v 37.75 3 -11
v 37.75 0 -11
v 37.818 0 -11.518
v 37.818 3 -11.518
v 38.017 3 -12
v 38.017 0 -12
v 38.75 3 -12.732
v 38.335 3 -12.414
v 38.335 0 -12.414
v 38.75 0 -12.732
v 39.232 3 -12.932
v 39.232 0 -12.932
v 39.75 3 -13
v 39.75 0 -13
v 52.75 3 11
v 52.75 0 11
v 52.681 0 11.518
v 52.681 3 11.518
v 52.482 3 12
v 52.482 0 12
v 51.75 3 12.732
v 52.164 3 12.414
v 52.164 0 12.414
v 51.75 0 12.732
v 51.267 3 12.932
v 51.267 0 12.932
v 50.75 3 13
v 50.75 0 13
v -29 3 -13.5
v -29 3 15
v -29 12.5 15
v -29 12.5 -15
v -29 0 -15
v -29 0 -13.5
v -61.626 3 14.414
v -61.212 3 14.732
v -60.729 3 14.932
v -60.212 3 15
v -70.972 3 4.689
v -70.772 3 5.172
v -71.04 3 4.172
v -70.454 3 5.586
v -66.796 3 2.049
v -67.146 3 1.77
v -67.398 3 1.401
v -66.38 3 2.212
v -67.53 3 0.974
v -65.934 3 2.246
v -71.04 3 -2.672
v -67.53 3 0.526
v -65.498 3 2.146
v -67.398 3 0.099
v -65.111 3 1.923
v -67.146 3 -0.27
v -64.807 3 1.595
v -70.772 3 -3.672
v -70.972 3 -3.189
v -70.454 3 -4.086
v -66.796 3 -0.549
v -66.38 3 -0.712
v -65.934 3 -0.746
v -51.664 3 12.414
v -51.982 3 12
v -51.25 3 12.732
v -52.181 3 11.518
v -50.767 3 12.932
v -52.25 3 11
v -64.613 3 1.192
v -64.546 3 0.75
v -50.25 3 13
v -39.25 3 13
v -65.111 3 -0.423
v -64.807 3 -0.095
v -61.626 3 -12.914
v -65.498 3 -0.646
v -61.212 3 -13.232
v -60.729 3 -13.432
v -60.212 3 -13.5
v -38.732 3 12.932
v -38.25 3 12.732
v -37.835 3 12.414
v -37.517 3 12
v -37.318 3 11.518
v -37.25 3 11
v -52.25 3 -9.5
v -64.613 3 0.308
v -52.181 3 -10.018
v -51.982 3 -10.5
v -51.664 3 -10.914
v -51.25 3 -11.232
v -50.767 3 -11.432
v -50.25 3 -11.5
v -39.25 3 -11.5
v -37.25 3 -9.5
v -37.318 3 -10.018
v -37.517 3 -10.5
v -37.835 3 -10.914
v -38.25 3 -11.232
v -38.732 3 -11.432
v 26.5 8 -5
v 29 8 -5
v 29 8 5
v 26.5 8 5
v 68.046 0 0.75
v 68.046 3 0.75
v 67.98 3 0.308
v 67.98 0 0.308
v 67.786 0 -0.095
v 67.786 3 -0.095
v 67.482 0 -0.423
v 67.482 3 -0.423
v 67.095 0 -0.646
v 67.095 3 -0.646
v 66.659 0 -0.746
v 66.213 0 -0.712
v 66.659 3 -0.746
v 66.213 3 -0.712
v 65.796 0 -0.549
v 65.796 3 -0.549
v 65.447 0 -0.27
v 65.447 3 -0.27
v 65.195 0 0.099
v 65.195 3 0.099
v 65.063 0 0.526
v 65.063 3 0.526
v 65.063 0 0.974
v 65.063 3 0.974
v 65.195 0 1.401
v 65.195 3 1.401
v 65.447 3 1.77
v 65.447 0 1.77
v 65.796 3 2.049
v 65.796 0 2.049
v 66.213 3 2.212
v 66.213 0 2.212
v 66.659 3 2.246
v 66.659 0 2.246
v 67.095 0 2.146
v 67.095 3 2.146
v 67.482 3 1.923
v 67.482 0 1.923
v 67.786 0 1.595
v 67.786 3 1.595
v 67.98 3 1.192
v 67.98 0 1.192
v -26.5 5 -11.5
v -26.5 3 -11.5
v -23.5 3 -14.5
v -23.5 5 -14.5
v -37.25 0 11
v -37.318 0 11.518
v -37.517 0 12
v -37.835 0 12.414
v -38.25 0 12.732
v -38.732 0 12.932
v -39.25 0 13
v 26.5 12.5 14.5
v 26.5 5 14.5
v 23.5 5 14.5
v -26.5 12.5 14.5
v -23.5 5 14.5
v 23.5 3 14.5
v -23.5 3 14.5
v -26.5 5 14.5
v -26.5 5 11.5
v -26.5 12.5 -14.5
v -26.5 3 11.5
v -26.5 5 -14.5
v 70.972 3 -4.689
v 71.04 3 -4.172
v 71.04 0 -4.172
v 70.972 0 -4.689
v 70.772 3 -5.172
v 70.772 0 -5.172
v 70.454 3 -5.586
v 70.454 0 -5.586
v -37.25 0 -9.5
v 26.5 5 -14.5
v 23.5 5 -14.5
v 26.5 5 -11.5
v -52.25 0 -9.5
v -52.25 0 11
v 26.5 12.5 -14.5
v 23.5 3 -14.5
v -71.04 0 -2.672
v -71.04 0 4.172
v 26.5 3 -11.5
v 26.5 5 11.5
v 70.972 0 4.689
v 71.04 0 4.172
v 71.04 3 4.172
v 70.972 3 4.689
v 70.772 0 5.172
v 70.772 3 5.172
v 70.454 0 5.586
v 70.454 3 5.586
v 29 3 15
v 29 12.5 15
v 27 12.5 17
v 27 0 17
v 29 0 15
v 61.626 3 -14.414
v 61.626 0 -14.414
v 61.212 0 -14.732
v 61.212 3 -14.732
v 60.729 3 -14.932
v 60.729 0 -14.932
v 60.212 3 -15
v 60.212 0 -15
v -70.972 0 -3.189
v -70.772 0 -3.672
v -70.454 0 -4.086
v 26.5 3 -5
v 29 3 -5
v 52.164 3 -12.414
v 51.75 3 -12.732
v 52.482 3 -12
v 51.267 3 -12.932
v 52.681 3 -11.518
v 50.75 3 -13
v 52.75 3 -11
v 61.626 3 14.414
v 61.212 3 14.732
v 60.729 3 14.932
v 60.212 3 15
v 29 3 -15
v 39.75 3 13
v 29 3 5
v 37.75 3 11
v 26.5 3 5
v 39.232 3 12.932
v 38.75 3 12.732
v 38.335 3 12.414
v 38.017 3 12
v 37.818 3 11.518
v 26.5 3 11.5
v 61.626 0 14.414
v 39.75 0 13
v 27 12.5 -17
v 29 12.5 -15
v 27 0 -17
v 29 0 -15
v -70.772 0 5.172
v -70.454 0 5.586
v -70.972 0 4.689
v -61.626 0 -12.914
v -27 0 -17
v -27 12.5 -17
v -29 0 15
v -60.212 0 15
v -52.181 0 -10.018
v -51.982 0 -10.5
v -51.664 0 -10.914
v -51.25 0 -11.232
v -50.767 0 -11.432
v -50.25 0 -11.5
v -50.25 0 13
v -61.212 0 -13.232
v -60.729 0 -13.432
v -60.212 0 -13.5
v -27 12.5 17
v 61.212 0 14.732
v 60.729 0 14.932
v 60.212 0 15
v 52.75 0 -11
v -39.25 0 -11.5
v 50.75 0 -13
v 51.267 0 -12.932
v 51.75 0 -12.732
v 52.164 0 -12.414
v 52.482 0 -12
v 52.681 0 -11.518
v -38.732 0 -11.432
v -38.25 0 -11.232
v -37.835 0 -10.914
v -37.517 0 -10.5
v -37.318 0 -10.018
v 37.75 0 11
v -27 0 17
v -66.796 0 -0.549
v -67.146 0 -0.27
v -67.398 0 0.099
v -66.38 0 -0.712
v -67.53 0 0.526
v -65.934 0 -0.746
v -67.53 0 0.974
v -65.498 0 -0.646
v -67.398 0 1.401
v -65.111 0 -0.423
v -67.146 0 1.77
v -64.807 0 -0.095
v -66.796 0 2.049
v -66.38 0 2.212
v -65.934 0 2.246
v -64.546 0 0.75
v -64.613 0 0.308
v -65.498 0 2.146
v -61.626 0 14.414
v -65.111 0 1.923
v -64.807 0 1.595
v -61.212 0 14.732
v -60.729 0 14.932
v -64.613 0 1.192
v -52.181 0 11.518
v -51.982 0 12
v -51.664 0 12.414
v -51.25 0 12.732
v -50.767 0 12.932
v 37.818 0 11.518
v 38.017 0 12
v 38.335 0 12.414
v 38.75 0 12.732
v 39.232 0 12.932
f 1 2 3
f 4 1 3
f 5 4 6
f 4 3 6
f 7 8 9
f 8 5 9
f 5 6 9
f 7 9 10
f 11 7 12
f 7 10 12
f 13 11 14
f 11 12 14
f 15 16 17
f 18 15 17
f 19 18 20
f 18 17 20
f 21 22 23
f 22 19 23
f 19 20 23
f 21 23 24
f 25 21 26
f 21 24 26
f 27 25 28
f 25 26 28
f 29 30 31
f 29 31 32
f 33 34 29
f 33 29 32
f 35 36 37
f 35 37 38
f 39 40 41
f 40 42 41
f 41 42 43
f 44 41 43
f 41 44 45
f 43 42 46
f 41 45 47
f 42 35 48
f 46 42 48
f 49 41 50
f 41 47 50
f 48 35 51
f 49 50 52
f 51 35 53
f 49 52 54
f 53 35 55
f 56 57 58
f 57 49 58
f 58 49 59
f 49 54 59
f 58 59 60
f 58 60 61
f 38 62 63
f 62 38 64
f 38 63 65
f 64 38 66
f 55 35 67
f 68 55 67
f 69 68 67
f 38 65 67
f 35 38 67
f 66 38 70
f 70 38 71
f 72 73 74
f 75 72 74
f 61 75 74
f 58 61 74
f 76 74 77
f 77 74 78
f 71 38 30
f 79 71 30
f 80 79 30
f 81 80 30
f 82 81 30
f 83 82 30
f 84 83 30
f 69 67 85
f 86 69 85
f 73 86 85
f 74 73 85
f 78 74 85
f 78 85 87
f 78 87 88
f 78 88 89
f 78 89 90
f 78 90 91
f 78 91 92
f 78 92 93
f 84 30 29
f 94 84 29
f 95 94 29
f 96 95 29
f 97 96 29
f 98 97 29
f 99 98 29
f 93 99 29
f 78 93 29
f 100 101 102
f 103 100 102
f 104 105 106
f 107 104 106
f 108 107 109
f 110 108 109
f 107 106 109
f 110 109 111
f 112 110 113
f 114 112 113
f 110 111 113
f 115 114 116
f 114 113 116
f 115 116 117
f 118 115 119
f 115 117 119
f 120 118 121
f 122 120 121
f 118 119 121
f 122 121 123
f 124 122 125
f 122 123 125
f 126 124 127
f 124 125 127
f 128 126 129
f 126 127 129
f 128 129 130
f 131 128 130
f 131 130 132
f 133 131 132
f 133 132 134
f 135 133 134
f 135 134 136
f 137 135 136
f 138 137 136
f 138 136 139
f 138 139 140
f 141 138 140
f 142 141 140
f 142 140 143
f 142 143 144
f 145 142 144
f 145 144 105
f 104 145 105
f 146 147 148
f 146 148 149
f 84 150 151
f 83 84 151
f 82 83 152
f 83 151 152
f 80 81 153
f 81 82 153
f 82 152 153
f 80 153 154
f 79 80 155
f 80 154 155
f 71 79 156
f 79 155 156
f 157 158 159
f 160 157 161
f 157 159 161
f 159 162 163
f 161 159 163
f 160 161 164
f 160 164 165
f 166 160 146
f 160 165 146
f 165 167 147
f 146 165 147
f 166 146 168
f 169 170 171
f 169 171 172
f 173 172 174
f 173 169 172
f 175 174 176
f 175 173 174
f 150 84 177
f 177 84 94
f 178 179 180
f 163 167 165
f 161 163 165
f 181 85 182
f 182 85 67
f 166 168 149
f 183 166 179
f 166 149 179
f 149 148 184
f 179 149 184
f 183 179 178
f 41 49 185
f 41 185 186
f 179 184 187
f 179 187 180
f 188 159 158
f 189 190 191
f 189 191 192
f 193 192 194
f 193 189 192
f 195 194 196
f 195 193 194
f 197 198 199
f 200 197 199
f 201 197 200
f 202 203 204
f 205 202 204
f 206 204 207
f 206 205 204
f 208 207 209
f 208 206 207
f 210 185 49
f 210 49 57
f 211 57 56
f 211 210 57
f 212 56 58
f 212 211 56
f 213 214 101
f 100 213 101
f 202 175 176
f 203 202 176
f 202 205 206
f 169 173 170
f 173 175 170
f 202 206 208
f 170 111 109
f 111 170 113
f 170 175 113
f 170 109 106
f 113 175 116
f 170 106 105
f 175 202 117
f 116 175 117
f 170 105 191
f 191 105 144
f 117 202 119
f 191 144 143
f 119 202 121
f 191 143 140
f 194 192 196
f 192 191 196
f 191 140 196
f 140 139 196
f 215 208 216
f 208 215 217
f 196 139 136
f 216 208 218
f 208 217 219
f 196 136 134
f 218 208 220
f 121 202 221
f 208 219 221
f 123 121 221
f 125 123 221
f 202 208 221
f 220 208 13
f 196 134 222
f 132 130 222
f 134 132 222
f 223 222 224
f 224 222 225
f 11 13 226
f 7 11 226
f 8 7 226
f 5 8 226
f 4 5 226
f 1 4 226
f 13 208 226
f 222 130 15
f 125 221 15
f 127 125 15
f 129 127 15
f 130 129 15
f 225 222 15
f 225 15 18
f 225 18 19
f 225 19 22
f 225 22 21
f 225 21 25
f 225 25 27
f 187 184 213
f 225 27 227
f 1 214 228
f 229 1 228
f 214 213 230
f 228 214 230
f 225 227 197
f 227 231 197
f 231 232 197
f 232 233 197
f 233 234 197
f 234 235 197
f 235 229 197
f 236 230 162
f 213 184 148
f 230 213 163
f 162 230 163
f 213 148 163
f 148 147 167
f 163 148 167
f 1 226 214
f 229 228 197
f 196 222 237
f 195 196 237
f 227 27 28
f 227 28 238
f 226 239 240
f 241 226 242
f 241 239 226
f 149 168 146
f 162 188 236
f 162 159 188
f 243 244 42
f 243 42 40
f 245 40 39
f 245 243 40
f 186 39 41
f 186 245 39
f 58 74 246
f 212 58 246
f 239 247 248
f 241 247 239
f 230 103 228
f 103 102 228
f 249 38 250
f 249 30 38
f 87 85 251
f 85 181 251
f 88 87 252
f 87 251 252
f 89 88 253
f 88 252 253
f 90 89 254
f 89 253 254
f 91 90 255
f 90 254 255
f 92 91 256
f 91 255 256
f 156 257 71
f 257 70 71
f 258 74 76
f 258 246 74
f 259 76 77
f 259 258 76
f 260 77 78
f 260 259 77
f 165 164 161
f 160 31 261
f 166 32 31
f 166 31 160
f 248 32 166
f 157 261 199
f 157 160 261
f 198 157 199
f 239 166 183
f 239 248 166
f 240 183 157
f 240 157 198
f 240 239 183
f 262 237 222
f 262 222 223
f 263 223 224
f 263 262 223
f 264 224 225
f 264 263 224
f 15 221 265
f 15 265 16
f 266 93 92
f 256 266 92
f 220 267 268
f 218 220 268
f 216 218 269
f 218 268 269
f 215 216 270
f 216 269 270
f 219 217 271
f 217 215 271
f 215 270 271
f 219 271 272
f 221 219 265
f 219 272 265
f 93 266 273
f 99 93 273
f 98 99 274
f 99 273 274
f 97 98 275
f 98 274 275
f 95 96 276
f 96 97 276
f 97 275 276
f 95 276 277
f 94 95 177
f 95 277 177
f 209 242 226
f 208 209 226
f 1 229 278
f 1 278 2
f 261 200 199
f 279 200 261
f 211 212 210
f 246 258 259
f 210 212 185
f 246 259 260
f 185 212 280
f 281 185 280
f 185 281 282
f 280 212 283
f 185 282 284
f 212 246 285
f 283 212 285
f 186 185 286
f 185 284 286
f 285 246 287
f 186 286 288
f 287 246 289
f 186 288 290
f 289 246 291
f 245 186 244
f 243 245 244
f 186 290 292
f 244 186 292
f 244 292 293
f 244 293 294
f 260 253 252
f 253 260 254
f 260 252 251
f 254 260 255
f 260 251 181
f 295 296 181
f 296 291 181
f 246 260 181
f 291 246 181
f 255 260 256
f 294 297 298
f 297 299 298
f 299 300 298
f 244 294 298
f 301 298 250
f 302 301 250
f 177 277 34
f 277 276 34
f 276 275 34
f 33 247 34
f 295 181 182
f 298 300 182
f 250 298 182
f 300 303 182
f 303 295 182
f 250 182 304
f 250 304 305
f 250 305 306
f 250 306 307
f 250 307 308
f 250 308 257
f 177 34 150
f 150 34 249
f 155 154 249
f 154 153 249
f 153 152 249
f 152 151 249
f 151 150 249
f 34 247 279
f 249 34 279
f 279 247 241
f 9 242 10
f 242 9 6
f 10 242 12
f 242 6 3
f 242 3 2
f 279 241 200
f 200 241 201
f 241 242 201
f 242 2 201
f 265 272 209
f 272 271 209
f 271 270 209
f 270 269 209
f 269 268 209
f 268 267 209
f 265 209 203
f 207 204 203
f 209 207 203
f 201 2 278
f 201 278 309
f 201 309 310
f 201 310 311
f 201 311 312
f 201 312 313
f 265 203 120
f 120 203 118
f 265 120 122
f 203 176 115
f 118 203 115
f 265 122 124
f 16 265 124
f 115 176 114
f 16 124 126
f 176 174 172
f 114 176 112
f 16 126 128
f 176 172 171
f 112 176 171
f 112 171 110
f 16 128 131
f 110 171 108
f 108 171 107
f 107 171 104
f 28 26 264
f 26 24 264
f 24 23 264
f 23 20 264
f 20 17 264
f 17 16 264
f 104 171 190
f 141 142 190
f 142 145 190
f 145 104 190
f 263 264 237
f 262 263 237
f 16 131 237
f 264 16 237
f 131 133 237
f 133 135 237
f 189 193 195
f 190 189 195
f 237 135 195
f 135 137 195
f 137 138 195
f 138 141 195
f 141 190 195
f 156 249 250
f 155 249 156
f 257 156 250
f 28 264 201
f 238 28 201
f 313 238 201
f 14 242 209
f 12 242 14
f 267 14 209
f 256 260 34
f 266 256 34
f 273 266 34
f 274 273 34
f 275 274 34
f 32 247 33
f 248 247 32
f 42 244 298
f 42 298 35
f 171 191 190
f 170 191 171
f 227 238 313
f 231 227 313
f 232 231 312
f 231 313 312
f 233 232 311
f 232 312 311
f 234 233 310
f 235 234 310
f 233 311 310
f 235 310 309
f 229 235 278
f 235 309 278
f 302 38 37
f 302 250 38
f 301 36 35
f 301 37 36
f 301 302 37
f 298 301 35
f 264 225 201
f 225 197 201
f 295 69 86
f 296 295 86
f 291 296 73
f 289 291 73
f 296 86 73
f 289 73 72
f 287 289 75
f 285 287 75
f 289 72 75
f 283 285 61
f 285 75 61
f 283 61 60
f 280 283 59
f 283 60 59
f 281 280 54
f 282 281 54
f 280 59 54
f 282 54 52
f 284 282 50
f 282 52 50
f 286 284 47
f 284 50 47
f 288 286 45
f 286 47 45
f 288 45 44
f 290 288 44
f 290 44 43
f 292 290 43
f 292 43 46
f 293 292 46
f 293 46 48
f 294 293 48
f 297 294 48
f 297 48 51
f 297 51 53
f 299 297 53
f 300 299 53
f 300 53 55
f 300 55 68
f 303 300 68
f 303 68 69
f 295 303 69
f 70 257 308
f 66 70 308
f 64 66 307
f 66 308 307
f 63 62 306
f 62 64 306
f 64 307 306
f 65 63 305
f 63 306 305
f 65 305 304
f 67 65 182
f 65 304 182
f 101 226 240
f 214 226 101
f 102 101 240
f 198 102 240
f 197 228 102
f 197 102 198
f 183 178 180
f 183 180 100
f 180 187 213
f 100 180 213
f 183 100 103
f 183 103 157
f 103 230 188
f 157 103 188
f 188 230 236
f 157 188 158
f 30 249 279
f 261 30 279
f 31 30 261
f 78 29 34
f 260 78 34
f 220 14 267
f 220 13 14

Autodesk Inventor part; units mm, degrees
ref_plane "YZ Plane" through (0, 0, 0) normal (1, 0, 0) x (0, 1, 0)
ref_plane "XZ Plane" through (0, 0, 0) normal (0, 1, 0) x (-1, 0, 0)
ref_plane "XY Plane" through (0, 0, 0) normal (0, 0, 1) x (1, 0, 0)
sketch "Esboço1" plane through (0, 0, 0) normal (0, 1, 0) x (-1, 0, 0)
  line L0 (-29, 17) -> (29, 17)
  line L1 (29, 17) -> (29, -17)
  line L2 (29, -17) -> (-29, -17)
  line L3 (-29, -17) -> (-29, 17)
  line L4 (-29, 17) -> (29, -17) construction
  line L5 (29, 17) -> (-29, -17) construction
  point P0 (0, 0)
  point P1 (0.0565, -0.0161)
  dimension "d0" = 58
  dimension "d1" = 34
extrude "Extrusão1" add sketch "Esboço1" along normal blind 3
sketch "Esboço2" plane through (0, 3, 0) normal (0, 1, 0) x (1, 0, 0)
  line L0 (26.5, -14.5) -> (-26.5, -14.5)
  line L1 (-26.5, -14.5) -> (-26.5, 14.5)
  line L2 (-26.5, 14.5) -> (26.5, 14.5)
  line L3 (26.5, 14.5) -> (26.5, -14.5)
  line L4 (26.5, -14.5) -> (-26.5, 14.5) construction
  line L5 (-26.5, -14.5) -> (26.5, 14.5) construction
  line L6 (29, 17) -> (-29, 17) projected
  line L7 (29, -17) -> (-29, -17)
  line L8 (-29, -17) -> (-29, 17)
  line L9 (-29, 17) -> (29, 17)
  line L10 (29, 17) -> (29, -17)
  line L11 (29, -17) -> (-29, 17) construction
  line L12 (-29, -17) -> (29, 17) construction
  point P0 (0, 0)
  dimension "d4" = 53
  dimension "d5" = 29
extrude "Extrusão2" add sketch "Esboço2" along normal blind 9.5
sketch "Esboço3" plane through (0, 3, 0) normal (0, 1, 0) x (1, 0, 0)
  line L0 (-26.5, 14.5) -> (26.5, 14.5) projected
  line L1 (-26.5, -14.5) -> (-26.5, 14.5) projected
  line L2 (26.5, 14.5) -> (26.5, -14.5) projected
  line L3 (26.5, -14.5) -> (-26.5, -14.5) projected
  line L4 (-23.5, -14.5) -> (-26.5, -14.5)
  line L5 (-26.5, -14.5) -> (-26.5, -11.5)
  line L6 (-26.5, -11.5) -> (-23.5, -11.5)
  line L7 (-23.5, -11.5) -> (-23.5, -14.5)
  line L8 (-23.5, -14.5) -> (-26.5, -11.5) construction
  line L9 (-26.5, -14.5) -> (-23.5, -11.5) construction
  line L10 (-23.5, 11.5) -> (-26.5, 11.5)
  line L11 (-26.5, 11.5) -> (-26.5, 14.5)
  line L12 (-26.5, 14.5) -> (-23.5, 14.5)
  line L13 (-23.5, 14.5) -> (-23.5, 11.5)
  line L14 (-23.5, 11.5) -> (-26.5, 14.5) construction
  line L15 (-26.5, 11.5) -> (-23.5, 14.5) construction
  line L16 (26.5, -14.5) -> (23.5, -14.5)
  line L17 (23.5, -14.5) -> (23.5, -11.5)
  line L18 (23.5, -11.5) -> (26.5, -11.5)
  line L19 (26.5, -11.5) -> (26.5, -14.5)
  line L20 (26.5, -14.5) -> (23.5, -11.5) construction
  line L21 (23.5, -14.5) -> (26.5, -11.5) construction
  line L22 (26.5, 11.5) -> (23.5, 11.5)
  line L23 (23.5, 11.5) -> (23.5, 14.5)
  line L24 (23.5, 14.5) -> (26.5, 14.5)
  line L25 (26.5, 14.5) -> (26.5, 11.5)
  line L26 (26.5, 11.5) -> (23.5, 14.5) construction
  line L27 (23.5, 11.5) -> (26.5, 14.5) construction
  point P0 (0, 0)
  point P1 (-13.75, -16.75)
  point P2 (-13.75, 16.75)
  point P3 (13.75, 16.75)
  point P4 (13.75, -16.75)
  point P5 (-26.5, -13)
  dimension "d66" = 3
  dimension "d67" = 3
  dimension "d68" = 3
  dimension "d69" = 3
  dimension "d70" = 3
  dimension "d71" = 3
  dimension "d72" = 3
  dimension "d73" = 3
  dimension "d74" = 0
  dimension "d75" = 0
  dimension "d76" = 0
  dimension "d77" = 0
  dimension "d78" = 0
  dimension "d79" = 0
  dimension "d80" = 0
  dimension "d81" = 0
extrude "Extrusão3" add sketch "Esboço3" along normal blind 2 contours L0 L13 L10 L1 | L0 L2 L22 L23 | L6 L7 L3 L1 | L2 L3 L17 L18
chamfer "Chanfro1" distance 2 angle 45 4 edges at (29, 6.25, 17) (-29, 6.25, 17) (-29, 6.25, -17) (29, 6.25, -17)
sketch "Esboço7" plane through (29, 0, 15) normal (1, 0, 0) x (0, 0, -1)
  line L0 (30, 0) -> (0, 0) projected
  line L1 (0, 0) -> (30, 0)
  line L2 (30, 0) -> (30, 3)
  line L3 (30, 3) -> (0, 3)
  line L4 (0, 3) -> (0, 0)
  line L5 (30, 12.5) -> (30, 0) projected
  line L6 (0, 0) -> (0, 12.5) projected
  point P0 (15, 0)
  point P1 (15, 0)
  point P2 (15, 3)
  dimension "d36" = 3
  dimension "d42" = 0
  dimension "d43" = 0
extrude "Extrusão6" add sketch "Esboço7" along normal blind 42.04
sketch "Esboço9" plane through (-29, 0, -15) normal (-1, 0, 0) x (0, 0, 1)
  line L0 (30, 12.5) -> (30, 0) projected
  line L1 (1.5, 0) -> (30, 0)
  line L2 (30, 0) -> (30, 3)
  line L3 (30, 3) -> (1.5, 3)
  line L4 (1.5, 3) -> (1.5, 0)
  point P0 (15, 0)
  dimension "d59" = 3
extrude "Extrusão8" add sketch "Esboço9" along normal blind 42.04
sketch "Esboço8" plane through (29, 3, 15) normal (0, 1, 0) x (1, 0, 0)
  circle A0 centre (37.5465, 14.25) radius 1.5
  line L0 (0, 0) -> (0, 30) projected
  line L1 (23.7495, 2) -> (8.7495, 2)
  line L2 (8.7495, 2) -> (8.7495, 28)
  line L3 (8.7495, 28) -> (23.7495, 28)
  line L4 (23.7495, 28) -> (23.7495, 2)
  line L5 (0, 0) -> (42.04, 0) projected
  line L6 (0, 30) -> (42.04, 30) projected
  line L7 (-2, 32) -> (-56, 32) projected
  line L8 (-56, -2) -> (-2, -2) projected
  circle A1 centre (-95.0465, 14.25) radius 1.5
  line L9 (-81.2495, 2) -> (-66.2495, 2)
  line L10 (-66.2495, 2) -> (-66.2495, 26.5)
  line L11 (-66.2495, 26.5) -> (-81.2495, 26.5)
  line L12 (-81.2495, 26.5) -> (-81.2495, 2)
  point P0 (-29, 15)
  point P1 (23.7495, 15)
  point P2 (-81.2495, 14.25)
  dimension "d44" = 3
  dimension "d47" = 13.797
  dimension "d53" = 2
  dimension "d54" = 2
  dimension "d55" = 15
extrude "Extrusão7" cut sketch "Esboço8" against normal blind 42.04
chamfer "Chanfro2" distance 10 angle 45 4 edges at (71.04, 1.5, -15) (71.04, 1.5, 15) (-71.04, 1.5, -13.5) (-71.04, 1.5, 15)
sketch "Esboço10" plane through (29, 12.5, 15) normal (1, 0, 0) x (0, 0, -1)
  line L0 (0, -9.5) -> (30, -9.5) projected
  line L1 (30, 0) -> (30, -9.5) projected
  line L2 (0, 0) -> (30, 0) projected
  line L3 (0, -9.5) -> (0, 0) projected
  line L4 (10, -12.5) -> (10, -9.5) projected
  line L5 (10, -12.5) -> (20, -12.5) projected
  line L6 (20, -9.5) -> (20, -12.5) projected
  line L7 (20, -9.5) -> (10, -9.5) projected
  line L8 (5, -9.5) -> (20, -9.5)
  line L9 (20, -9.5) -> (20, -4.5)
  line L10 (20, -4.5) -> (10, -4.5)
  line L11 (10, -4.5) -> (10, -9.5)
  point P0 (15, -12.5)
  point P1 (20, -9.5)
  point P2 (15, 0)
  point P3 (15, -4.5)
  dimension "d82" = 10
  dimension "d83" = 0
  dimension "d84" = 4.5
  dimension "d85" = 0
  dimension "d86" = 5
extrude "Extrusão9" cut sketch "Esboço10" against normal blind 10 contours L11 L10 L9 L0
chamfer "Chanfro3" distance 3 angle 45 4 edges at (-23.5, 4, 11.5) (-23.5, 4, -11.5) (23.5, 4, -11.5) (23.5, 4, 11.5)
fillet "Arredondamento1" radius 2 8 edges at (-37.2495, 1.5, -11.5) (-37.2495, 1.5, 13) (-52.2495, 1.5, -11.5) (-52.2495, 1.5, 13) (37.7495, 1.5, -13) (37.7495, 1.5, 13) (52.7495, 1.5, -13) (52.7495, 1.5, 13)
fillet "Arredondamento2" radius 2 8 edges at (71.04, 1.5, -5) (71.04, 1.5, 5) (61.04, 1.5, -15) (61.04, 1.5, 15) (-61.04, 1.5, -13.5) (-71.04, 1.5, -3.5) (-71.04, 1.5, 5) (-61.04, 1.5, 15)
properties part number "espbase"
